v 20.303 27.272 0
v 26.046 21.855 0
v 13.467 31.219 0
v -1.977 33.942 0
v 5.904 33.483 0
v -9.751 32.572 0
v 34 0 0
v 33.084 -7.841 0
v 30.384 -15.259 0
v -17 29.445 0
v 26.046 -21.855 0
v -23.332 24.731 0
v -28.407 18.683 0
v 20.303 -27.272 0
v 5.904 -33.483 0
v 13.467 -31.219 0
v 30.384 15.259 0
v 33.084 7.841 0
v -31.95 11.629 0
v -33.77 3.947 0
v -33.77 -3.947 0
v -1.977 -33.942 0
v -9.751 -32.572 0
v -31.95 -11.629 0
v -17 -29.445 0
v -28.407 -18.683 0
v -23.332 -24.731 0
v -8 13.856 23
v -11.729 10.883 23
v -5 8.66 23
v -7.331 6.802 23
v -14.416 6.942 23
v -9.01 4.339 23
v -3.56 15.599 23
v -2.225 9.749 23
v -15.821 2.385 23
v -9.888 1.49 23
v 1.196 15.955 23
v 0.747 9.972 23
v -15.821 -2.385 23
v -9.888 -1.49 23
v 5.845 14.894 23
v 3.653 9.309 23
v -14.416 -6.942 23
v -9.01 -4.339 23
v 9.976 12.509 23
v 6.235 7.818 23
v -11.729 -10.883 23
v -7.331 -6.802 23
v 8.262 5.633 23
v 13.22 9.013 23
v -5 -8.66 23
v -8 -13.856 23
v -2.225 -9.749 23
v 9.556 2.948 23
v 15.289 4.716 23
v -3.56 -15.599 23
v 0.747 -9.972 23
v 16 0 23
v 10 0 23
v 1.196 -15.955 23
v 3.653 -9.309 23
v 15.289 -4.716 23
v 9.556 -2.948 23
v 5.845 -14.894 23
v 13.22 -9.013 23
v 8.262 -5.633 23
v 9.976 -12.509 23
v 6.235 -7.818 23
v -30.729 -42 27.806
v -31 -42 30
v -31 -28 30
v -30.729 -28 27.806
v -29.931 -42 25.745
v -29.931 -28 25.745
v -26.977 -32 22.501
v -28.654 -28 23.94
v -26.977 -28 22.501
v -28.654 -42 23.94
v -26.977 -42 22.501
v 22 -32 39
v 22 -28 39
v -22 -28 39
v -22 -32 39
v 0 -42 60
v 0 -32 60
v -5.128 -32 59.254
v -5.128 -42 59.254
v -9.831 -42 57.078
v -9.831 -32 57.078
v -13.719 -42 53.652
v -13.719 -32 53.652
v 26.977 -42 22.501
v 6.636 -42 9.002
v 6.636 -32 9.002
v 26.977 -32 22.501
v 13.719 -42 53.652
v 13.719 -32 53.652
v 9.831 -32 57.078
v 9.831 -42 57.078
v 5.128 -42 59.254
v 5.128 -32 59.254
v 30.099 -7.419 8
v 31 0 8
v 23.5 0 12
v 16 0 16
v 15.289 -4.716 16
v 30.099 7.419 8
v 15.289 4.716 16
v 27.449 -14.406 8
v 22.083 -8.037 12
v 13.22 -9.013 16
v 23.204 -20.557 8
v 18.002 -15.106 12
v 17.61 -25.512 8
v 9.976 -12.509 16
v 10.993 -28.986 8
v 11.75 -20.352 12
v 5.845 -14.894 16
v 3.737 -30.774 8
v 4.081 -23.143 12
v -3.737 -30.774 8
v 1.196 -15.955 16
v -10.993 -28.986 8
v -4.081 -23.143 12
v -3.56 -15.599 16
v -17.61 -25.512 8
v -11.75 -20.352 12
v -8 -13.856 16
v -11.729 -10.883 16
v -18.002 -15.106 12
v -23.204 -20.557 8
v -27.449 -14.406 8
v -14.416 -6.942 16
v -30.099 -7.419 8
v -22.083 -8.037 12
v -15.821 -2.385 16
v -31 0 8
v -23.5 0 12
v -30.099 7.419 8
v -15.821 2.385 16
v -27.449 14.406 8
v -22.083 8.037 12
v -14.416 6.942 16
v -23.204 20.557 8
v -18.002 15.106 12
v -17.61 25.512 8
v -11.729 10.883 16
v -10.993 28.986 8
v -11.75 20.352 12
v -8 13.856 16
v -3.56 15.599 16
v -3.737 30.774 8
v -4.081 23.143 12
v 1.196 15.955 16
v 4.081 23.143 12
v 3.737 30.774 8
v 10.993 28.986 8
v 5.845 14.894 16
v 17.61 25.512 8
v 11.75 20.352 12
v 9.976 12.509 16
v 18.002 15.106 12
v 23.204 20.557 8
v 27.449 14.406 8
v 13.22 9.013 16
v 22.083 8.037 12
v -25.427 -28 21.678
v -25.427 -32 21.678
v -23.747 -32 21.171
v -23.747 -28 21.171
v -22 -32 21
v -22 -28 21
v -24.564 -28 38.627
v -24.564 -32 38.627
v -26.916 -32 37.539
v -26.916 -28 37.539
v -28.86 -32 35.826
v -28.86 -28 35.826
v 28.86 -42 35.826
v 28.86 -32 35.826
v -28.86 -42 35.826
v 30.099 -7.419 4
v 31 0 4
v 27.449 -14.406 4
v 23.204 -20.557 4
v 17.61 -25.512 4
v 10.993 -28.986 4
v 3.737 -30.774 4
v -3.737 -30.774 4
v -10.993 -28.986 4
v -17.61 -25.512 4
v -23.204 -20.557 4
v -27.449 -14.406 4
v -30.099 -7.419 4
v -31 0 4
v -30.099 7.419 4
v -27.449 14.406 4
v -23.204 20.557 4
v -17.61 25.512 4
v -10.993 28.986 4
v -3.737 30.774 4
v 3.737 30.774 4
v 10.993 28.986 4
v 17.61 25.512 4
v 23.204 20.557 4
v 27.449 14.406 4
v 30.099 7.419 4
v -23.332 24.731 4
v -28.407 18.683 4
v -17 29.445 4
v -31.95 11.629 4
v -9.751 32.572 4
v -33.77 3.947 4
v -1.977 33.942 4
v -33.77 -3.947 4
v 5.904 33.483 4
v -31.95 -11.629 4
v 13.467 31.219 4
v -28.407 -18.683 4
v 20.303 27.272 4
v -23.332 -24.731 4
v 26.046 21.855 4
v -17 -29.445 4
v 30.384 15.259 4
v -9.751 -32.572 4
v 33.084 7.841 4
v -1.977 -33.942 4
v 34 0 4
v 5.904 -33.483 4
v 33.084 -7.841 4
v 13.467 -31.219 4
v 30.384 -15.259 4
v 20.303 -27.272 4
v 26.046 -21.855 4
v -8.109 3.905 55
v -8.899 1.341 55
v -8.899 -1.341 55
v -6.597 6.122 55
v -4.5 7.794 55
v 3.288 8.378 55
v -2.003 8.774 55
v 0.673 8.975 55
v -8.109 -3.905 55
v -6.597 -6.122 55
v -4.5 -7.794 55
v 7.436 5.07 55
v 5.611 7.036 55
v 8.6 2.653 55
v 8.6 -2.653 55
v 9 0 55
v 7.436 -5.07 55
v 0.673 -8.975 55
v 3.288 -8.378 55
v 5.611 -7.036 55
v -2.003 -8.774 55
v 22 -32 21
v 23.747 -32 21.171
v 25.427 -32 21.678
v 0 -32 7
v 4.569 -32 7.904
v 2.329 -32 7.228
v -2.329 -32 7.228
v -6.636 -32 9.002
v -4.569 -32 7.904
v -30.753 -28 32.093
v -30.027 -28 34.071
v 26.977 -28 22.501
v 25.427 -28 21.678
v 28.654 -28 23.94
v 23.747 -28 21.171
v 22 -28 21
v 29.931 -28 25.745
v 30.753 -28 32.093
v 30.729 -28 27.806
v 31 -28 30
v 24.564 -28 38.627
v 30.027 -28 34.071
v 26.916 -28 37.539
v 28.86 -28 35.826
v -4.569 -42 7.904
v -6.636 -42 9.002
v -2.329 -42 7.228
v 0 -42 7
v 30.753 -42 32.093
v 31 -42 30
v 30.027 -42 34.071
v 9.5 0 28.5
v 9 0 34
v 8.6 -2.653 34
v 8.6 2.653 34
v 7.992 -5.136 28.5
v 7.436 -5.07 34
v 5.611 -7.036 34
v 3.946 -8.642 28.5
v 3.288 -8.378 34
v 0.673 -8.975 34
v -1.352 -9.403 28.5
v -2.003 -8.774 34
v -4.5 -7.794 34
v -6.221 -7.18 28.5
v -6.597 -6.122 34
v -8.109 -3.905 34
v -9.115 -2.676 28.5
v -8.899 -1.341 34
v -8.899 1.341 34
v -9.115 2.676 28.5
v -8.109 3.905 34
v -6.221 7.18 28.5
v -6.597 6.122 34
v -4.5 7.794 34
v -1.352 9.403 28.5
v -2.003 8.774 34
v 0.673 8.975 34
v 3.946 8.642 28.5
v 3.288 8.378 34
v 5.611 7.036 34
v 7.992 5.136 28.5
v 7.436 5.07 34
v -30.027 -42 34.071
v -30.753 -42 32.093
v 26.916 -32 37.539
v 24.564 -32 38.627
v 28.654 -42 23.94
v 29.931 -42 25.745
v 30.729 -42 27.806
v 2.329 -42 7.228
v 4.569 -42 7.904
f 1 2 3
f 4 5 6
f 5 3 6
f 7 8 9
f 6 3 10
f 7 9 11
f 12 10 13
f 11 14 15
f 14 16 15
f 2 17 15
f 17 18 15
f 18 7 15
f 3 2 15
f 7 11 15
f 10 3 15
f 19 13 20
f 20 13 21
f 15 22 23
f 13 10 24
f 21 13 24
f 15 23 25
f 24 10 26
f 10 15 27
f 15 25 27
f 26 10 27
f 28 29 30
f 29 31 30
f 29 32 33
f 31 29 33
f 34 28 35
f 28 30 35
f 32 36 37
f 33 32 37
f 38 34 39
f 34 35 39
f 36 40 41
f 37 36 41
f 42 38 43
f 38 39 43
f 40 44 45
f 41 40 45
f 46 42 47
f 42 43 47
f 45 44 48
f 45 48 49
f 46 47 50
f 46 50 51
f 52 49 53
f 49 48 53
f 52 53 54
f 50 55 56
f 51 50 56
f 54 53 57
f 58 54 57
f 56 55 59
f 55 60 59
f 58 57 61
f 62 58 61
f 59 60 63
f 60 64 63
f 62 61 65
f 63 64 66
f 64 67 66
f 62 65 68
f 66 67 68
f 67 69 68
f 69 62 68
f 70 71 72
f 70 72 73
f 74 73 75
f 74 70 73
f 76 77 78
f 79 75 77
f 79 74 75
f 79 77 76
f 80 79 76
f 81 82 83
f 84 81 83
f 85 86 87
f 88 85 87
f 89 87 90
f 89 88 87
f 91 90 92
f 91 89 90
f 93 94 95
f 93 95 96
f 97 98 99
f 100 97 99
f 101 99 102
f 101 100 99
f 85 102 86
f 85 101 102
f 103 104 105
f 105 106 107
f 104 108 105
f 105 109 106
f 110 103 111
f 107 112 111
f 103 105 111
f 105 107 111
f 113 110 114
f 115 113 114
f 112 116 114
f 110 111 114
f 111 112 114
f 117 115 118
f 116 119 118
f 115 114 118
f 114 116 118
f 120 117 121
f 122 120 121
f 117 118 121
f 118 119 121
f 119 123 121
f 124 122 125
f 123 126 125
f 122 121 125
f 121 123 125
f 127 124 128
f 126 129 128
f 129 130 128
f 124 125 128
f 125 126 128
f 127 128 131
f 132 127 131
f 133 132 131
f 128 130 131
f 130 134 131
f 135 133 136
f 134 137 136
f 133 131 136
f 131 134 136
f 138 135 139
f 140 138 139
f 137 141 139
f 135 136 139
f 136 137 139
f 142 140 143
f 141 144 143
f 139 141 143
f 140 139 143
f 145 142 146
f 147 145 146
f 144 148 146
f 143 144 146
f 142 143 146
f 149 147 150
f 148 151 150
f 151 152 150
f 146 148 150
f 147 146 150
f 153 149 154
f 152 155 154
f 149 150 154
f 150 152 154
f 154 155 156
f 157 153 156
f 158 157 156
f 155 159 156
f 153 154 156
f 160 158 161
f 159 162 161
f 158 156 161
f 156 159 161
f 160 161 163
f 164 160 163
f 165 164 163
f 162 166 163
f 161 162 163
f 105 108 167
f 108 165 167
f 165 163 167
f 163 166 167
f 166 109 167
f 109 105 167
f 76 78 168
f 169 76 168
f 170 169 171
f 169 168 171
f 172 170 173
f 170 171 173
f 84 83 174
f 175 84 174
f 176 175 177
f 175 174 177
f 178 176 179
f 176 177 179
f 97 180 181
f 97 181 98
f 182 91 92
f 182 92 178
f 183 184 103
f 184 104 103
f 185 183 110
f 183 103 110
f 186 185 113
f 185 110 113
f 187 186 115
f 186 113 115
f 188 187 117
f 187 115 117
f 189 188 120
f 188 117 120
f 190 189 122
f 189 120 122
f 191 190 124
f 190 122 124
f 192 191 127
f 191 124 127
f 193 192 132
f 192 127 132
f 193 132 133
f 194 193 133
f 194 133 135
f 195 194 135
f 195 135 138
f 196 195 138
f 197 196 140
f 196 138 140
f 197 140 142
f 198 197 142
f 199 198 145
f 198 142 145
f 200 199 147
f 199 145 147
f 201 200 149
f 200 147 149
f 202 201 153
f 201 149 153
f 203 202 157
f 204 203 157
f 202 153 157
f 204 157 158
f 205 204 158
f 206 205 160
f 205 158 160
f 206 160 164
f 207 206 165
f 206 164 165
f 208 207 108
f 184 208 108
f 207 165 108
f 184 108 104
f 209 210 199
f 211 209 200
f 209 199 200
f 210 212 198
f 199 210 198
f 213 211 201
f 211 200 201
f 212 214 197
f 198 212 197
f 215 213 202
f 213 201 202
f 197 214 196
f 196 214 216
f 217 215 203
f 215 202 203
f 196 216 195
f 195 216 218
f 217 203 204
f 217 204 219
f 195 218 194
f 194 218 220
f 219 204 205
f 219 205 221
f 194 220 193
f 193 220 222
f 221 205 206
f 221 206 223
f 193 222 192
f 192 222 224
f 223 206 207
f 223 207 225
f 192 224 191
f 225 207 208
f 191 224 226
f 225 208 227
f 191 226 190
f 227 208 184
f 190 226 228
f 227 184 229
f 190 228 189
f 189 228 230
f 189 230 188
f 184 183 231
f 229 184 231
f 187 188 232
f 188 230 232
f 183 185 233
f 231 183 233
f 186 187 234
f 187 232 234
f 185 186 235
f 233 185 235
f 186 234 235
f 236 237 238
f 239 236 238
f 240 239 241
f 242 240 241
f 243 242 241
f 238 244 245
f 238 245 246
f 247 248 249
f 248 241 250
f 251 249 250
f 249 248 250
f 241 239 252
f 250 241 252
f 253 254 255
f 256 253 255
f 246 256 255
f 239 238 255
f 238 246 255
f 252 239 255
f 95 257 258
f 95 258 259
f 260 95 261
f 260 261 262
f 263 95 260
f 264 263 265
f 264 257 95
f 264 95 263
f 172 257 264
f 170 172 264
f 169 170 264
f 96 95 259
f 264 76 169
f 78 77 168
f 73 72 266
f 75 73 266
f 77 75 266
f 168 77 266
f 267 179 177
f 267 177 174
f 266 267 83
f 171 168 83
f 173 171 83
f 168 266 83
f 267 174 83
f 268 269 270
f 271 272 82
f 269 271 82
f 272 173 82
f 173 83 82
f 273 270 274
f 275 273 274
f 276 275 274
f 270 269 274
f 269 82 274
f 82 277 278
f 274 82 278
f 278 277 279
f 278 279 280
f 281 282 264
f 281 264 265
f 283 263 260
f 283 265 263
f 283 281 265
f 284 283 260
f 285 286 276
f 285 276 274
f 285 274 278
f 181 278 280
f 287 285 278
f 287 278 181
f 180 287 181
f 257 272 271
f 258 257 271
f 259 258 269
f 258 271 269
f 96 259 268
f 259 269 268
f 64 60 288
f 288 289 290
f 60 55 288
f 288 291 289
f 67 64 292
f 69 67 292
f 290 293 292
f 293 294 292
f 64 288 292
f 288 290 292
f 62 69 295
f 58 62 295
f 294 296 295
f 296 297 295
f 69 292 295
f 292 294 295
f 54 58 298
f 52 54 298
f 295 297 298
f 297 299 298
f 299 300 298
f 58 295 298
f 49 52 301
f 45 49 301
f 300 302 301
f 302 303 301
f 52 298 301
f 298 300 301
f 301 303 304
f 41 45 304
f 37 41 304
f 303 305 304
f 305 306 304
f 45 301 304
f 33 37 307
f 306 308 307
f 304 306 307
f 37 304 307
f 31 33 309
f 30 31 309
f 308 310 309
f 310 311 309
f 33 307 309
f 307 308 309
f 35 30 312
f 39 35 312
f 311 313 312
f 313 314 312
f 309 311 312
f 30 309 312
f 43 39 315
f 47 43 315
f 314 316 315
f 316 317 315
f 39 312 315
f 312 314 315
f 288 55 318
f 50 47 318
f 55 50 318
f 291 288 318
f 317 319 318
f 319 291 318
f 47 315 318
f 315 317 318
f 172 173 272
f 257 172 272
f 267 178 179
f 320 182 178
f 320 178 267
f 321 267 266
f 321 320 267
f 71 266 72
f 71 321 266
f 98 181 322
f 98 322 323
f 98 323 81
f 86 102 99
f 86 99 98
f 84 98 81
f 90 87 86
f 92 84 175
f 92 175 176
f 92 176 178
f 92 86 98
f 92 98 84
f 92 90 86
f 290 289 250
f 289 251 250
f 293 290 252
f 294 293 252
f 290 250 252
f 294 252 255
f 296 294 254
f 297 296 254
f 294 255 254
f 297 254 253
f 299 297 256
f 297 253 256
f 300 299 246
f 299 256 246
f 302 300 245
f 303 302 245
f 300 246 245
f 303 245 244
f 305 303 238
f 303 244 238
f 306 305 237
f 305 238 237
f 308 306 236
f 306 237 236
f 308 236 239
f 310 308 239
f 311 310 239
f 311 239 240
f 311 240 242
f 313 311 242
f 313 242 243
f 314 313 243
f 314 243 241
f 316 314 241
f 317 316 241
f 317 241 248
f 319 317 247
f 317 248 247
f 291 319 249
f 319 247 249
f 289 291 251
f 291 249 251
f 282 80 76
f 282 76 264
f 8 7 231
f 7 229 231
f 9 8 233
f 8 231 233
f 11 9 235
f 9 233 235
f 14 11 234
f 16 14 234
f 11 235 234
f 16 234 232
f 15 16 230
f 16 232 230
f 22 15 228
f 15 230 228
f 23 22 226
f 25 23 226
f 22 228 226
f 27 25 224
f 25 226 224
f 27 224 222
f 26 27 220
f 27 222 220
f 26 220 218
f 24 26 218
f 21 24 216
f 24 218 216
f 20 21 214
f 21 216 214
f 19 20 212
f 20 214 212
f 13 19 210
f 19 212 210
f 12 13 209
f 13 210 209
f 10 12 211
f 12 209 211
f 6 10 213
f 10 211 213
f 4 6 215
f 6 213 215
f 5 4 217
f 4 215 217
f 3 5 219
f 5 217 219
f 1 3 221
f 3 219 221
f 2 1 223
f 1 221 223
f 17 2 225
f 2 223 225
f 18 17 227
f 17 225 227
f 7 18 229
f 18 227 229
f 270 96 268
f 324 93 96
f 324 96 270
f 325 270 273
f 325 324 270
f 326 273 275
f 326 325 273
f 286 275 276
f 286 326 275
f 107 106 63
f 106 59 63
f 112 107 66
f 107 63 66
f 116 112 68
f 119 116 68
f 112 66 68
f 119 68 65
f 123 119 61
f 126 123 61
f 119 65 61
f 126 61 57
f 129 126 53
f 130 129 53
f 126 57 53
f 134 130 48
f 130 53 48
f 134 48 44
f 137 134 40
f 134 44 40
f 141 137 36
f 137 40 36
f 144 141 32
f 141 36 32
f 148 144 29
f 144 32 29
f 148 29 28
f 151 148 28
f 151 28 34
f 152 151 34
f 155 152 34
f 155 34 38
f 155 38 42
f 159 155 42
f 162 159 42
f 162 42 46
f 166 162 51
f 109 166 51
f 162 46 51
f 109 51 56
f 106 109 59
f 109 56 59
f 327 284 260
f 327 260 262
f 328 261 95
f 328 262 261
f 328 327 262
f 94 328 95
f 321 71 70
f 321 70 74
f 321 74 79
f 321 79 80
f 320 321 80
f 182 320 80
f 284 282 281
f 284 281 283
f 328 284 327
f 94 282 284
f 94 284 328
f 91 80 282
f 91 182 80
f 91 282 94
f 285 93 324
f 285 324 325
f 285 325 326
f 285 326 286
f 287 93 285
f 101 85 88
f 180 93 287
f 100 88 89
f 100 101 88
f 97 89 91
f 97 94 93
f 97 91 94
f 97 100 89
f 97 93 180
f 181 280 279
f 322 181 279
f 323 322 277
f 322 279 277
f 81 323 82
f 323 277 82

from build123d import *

# Parameters (mm, degrees)
F4_DEPTH = 14
F6_DEPTH = 4


with BuildPart() as f1:
    # F0 (on Front) → F1 (revolve)
    with BuildSketch(Plane.XZ):
        Polygon((0, 0), (34, 0), (34, 4), (31, 4), (31, 8), (16, 16), (16, 23), (10, 23), (9, 34), (9, 55), (0, 55), align=None)
    revolve(axis=Axis((0, 0, 27.5), (0, 0, -1)))


with BuildPart() as f4:
    # F3 (on offset) → F4 (new body)
    with BuildSketch(Plane.XZ.offset(42)):
        with BuildLine():
            ThreePointArc((26.9766909288, 22.501163597), (29.93064368, 25.7450157673), (31, 30))
            ThreePointArc((31, 30), (30.4480034885, 33.1034234416), (28.8597250983, 35.8261626802))
            Line((28.8597250983, 35.8261626802), (13.7194501966, 53.6523253604))
            ThreePointArc((13.7194501966, 53.6523253604), (7.5583775876, 58.3361846293), (0, 60))
            ThreePointArc((0, 60), (-7.5583775876, 58.3361846293), (-13.7194501966, 53.6523253604))
            Line((-13.7194501966, 53.6523253604), (-28.8597250983, 35.8261626802))
            ThreePointArc((-28.8597250983, 35.8261626802), (-30.4480034885, 33.1034234416), (-31, 30))
            ThreePointArc((-31, 30), (-29.93064368, 25.7450157673), (-26.9766909288, 22.501163597))
            Line((-26.9766909288, 22.501163597), (-6.635587905, 9.0015514626))
            ThreePointArc((-6.635587905, 9.0015514626), (-3.4654449607, 7.5112798265), (0, 7))
            ThreePointArc((0, 7), (3.4654449607, 7.5112798265), (6.635587905, 9.0015514626))
            Line((6.635587905, 9.0015514626), (26.9766909288, 22.501163597))
        make_face()
    extrude(amount=-F4_DEPTH)

    # F5 (on face) → F6 (cut)
    with BuildSketch(Plane(origin=(0, -28, 0), x_dir=(-1, 0, 0), z_dir=(0, 1, 0))):
        with BuildLine():
            ThreePointArc((-22, 21), (-24.5990837205, 21.3834598699), (-26.9766909288, 22.501163597))
            Line((-26.9766909288, 22.501163597), (-6.635587905, 9.0015514626))
            ThreePointArc((-6.635587905, 9.0015514626), (0, 7), (6.635587905, 9.0015514626))
            Line((6.635587905, 9.0015514626), (26.9766909288, 22.501163597))
            ThreePointArc((26.9766909288, 22.501163597), (24.5990837205, 21.3834598699), (22, 21))
            Line((22, 21), (-22, 21))
        make_face()
        with BuildLine():
            ThreePointArc((-28.8597250983, 35.8261626802), (-25.7791887938, 38.1680923147), (-22, 39))
            Line((-22, 39), (22, 39))
            ThreePointArc((22, 39), (25.7791887938, 38.1680923147), (28.8597250983, 35.8261626802))
            Line((28.8597250983, 35.8261626802), (13.7194501966, 53.6523253604))
            ThreePointArc((13.7194501966, 53.6523253604), (0, 60), (-13.7194501966, 53.6523253604))
            Line((-13.7194501966, 53.6523253604), (-28.8597250983, 35.8261626802))
        make_face()
    extrude(amount=-F6_DEPTH, mode=Mode.SUBTRACT)


solid = Compound([f1.part, f4.part])
